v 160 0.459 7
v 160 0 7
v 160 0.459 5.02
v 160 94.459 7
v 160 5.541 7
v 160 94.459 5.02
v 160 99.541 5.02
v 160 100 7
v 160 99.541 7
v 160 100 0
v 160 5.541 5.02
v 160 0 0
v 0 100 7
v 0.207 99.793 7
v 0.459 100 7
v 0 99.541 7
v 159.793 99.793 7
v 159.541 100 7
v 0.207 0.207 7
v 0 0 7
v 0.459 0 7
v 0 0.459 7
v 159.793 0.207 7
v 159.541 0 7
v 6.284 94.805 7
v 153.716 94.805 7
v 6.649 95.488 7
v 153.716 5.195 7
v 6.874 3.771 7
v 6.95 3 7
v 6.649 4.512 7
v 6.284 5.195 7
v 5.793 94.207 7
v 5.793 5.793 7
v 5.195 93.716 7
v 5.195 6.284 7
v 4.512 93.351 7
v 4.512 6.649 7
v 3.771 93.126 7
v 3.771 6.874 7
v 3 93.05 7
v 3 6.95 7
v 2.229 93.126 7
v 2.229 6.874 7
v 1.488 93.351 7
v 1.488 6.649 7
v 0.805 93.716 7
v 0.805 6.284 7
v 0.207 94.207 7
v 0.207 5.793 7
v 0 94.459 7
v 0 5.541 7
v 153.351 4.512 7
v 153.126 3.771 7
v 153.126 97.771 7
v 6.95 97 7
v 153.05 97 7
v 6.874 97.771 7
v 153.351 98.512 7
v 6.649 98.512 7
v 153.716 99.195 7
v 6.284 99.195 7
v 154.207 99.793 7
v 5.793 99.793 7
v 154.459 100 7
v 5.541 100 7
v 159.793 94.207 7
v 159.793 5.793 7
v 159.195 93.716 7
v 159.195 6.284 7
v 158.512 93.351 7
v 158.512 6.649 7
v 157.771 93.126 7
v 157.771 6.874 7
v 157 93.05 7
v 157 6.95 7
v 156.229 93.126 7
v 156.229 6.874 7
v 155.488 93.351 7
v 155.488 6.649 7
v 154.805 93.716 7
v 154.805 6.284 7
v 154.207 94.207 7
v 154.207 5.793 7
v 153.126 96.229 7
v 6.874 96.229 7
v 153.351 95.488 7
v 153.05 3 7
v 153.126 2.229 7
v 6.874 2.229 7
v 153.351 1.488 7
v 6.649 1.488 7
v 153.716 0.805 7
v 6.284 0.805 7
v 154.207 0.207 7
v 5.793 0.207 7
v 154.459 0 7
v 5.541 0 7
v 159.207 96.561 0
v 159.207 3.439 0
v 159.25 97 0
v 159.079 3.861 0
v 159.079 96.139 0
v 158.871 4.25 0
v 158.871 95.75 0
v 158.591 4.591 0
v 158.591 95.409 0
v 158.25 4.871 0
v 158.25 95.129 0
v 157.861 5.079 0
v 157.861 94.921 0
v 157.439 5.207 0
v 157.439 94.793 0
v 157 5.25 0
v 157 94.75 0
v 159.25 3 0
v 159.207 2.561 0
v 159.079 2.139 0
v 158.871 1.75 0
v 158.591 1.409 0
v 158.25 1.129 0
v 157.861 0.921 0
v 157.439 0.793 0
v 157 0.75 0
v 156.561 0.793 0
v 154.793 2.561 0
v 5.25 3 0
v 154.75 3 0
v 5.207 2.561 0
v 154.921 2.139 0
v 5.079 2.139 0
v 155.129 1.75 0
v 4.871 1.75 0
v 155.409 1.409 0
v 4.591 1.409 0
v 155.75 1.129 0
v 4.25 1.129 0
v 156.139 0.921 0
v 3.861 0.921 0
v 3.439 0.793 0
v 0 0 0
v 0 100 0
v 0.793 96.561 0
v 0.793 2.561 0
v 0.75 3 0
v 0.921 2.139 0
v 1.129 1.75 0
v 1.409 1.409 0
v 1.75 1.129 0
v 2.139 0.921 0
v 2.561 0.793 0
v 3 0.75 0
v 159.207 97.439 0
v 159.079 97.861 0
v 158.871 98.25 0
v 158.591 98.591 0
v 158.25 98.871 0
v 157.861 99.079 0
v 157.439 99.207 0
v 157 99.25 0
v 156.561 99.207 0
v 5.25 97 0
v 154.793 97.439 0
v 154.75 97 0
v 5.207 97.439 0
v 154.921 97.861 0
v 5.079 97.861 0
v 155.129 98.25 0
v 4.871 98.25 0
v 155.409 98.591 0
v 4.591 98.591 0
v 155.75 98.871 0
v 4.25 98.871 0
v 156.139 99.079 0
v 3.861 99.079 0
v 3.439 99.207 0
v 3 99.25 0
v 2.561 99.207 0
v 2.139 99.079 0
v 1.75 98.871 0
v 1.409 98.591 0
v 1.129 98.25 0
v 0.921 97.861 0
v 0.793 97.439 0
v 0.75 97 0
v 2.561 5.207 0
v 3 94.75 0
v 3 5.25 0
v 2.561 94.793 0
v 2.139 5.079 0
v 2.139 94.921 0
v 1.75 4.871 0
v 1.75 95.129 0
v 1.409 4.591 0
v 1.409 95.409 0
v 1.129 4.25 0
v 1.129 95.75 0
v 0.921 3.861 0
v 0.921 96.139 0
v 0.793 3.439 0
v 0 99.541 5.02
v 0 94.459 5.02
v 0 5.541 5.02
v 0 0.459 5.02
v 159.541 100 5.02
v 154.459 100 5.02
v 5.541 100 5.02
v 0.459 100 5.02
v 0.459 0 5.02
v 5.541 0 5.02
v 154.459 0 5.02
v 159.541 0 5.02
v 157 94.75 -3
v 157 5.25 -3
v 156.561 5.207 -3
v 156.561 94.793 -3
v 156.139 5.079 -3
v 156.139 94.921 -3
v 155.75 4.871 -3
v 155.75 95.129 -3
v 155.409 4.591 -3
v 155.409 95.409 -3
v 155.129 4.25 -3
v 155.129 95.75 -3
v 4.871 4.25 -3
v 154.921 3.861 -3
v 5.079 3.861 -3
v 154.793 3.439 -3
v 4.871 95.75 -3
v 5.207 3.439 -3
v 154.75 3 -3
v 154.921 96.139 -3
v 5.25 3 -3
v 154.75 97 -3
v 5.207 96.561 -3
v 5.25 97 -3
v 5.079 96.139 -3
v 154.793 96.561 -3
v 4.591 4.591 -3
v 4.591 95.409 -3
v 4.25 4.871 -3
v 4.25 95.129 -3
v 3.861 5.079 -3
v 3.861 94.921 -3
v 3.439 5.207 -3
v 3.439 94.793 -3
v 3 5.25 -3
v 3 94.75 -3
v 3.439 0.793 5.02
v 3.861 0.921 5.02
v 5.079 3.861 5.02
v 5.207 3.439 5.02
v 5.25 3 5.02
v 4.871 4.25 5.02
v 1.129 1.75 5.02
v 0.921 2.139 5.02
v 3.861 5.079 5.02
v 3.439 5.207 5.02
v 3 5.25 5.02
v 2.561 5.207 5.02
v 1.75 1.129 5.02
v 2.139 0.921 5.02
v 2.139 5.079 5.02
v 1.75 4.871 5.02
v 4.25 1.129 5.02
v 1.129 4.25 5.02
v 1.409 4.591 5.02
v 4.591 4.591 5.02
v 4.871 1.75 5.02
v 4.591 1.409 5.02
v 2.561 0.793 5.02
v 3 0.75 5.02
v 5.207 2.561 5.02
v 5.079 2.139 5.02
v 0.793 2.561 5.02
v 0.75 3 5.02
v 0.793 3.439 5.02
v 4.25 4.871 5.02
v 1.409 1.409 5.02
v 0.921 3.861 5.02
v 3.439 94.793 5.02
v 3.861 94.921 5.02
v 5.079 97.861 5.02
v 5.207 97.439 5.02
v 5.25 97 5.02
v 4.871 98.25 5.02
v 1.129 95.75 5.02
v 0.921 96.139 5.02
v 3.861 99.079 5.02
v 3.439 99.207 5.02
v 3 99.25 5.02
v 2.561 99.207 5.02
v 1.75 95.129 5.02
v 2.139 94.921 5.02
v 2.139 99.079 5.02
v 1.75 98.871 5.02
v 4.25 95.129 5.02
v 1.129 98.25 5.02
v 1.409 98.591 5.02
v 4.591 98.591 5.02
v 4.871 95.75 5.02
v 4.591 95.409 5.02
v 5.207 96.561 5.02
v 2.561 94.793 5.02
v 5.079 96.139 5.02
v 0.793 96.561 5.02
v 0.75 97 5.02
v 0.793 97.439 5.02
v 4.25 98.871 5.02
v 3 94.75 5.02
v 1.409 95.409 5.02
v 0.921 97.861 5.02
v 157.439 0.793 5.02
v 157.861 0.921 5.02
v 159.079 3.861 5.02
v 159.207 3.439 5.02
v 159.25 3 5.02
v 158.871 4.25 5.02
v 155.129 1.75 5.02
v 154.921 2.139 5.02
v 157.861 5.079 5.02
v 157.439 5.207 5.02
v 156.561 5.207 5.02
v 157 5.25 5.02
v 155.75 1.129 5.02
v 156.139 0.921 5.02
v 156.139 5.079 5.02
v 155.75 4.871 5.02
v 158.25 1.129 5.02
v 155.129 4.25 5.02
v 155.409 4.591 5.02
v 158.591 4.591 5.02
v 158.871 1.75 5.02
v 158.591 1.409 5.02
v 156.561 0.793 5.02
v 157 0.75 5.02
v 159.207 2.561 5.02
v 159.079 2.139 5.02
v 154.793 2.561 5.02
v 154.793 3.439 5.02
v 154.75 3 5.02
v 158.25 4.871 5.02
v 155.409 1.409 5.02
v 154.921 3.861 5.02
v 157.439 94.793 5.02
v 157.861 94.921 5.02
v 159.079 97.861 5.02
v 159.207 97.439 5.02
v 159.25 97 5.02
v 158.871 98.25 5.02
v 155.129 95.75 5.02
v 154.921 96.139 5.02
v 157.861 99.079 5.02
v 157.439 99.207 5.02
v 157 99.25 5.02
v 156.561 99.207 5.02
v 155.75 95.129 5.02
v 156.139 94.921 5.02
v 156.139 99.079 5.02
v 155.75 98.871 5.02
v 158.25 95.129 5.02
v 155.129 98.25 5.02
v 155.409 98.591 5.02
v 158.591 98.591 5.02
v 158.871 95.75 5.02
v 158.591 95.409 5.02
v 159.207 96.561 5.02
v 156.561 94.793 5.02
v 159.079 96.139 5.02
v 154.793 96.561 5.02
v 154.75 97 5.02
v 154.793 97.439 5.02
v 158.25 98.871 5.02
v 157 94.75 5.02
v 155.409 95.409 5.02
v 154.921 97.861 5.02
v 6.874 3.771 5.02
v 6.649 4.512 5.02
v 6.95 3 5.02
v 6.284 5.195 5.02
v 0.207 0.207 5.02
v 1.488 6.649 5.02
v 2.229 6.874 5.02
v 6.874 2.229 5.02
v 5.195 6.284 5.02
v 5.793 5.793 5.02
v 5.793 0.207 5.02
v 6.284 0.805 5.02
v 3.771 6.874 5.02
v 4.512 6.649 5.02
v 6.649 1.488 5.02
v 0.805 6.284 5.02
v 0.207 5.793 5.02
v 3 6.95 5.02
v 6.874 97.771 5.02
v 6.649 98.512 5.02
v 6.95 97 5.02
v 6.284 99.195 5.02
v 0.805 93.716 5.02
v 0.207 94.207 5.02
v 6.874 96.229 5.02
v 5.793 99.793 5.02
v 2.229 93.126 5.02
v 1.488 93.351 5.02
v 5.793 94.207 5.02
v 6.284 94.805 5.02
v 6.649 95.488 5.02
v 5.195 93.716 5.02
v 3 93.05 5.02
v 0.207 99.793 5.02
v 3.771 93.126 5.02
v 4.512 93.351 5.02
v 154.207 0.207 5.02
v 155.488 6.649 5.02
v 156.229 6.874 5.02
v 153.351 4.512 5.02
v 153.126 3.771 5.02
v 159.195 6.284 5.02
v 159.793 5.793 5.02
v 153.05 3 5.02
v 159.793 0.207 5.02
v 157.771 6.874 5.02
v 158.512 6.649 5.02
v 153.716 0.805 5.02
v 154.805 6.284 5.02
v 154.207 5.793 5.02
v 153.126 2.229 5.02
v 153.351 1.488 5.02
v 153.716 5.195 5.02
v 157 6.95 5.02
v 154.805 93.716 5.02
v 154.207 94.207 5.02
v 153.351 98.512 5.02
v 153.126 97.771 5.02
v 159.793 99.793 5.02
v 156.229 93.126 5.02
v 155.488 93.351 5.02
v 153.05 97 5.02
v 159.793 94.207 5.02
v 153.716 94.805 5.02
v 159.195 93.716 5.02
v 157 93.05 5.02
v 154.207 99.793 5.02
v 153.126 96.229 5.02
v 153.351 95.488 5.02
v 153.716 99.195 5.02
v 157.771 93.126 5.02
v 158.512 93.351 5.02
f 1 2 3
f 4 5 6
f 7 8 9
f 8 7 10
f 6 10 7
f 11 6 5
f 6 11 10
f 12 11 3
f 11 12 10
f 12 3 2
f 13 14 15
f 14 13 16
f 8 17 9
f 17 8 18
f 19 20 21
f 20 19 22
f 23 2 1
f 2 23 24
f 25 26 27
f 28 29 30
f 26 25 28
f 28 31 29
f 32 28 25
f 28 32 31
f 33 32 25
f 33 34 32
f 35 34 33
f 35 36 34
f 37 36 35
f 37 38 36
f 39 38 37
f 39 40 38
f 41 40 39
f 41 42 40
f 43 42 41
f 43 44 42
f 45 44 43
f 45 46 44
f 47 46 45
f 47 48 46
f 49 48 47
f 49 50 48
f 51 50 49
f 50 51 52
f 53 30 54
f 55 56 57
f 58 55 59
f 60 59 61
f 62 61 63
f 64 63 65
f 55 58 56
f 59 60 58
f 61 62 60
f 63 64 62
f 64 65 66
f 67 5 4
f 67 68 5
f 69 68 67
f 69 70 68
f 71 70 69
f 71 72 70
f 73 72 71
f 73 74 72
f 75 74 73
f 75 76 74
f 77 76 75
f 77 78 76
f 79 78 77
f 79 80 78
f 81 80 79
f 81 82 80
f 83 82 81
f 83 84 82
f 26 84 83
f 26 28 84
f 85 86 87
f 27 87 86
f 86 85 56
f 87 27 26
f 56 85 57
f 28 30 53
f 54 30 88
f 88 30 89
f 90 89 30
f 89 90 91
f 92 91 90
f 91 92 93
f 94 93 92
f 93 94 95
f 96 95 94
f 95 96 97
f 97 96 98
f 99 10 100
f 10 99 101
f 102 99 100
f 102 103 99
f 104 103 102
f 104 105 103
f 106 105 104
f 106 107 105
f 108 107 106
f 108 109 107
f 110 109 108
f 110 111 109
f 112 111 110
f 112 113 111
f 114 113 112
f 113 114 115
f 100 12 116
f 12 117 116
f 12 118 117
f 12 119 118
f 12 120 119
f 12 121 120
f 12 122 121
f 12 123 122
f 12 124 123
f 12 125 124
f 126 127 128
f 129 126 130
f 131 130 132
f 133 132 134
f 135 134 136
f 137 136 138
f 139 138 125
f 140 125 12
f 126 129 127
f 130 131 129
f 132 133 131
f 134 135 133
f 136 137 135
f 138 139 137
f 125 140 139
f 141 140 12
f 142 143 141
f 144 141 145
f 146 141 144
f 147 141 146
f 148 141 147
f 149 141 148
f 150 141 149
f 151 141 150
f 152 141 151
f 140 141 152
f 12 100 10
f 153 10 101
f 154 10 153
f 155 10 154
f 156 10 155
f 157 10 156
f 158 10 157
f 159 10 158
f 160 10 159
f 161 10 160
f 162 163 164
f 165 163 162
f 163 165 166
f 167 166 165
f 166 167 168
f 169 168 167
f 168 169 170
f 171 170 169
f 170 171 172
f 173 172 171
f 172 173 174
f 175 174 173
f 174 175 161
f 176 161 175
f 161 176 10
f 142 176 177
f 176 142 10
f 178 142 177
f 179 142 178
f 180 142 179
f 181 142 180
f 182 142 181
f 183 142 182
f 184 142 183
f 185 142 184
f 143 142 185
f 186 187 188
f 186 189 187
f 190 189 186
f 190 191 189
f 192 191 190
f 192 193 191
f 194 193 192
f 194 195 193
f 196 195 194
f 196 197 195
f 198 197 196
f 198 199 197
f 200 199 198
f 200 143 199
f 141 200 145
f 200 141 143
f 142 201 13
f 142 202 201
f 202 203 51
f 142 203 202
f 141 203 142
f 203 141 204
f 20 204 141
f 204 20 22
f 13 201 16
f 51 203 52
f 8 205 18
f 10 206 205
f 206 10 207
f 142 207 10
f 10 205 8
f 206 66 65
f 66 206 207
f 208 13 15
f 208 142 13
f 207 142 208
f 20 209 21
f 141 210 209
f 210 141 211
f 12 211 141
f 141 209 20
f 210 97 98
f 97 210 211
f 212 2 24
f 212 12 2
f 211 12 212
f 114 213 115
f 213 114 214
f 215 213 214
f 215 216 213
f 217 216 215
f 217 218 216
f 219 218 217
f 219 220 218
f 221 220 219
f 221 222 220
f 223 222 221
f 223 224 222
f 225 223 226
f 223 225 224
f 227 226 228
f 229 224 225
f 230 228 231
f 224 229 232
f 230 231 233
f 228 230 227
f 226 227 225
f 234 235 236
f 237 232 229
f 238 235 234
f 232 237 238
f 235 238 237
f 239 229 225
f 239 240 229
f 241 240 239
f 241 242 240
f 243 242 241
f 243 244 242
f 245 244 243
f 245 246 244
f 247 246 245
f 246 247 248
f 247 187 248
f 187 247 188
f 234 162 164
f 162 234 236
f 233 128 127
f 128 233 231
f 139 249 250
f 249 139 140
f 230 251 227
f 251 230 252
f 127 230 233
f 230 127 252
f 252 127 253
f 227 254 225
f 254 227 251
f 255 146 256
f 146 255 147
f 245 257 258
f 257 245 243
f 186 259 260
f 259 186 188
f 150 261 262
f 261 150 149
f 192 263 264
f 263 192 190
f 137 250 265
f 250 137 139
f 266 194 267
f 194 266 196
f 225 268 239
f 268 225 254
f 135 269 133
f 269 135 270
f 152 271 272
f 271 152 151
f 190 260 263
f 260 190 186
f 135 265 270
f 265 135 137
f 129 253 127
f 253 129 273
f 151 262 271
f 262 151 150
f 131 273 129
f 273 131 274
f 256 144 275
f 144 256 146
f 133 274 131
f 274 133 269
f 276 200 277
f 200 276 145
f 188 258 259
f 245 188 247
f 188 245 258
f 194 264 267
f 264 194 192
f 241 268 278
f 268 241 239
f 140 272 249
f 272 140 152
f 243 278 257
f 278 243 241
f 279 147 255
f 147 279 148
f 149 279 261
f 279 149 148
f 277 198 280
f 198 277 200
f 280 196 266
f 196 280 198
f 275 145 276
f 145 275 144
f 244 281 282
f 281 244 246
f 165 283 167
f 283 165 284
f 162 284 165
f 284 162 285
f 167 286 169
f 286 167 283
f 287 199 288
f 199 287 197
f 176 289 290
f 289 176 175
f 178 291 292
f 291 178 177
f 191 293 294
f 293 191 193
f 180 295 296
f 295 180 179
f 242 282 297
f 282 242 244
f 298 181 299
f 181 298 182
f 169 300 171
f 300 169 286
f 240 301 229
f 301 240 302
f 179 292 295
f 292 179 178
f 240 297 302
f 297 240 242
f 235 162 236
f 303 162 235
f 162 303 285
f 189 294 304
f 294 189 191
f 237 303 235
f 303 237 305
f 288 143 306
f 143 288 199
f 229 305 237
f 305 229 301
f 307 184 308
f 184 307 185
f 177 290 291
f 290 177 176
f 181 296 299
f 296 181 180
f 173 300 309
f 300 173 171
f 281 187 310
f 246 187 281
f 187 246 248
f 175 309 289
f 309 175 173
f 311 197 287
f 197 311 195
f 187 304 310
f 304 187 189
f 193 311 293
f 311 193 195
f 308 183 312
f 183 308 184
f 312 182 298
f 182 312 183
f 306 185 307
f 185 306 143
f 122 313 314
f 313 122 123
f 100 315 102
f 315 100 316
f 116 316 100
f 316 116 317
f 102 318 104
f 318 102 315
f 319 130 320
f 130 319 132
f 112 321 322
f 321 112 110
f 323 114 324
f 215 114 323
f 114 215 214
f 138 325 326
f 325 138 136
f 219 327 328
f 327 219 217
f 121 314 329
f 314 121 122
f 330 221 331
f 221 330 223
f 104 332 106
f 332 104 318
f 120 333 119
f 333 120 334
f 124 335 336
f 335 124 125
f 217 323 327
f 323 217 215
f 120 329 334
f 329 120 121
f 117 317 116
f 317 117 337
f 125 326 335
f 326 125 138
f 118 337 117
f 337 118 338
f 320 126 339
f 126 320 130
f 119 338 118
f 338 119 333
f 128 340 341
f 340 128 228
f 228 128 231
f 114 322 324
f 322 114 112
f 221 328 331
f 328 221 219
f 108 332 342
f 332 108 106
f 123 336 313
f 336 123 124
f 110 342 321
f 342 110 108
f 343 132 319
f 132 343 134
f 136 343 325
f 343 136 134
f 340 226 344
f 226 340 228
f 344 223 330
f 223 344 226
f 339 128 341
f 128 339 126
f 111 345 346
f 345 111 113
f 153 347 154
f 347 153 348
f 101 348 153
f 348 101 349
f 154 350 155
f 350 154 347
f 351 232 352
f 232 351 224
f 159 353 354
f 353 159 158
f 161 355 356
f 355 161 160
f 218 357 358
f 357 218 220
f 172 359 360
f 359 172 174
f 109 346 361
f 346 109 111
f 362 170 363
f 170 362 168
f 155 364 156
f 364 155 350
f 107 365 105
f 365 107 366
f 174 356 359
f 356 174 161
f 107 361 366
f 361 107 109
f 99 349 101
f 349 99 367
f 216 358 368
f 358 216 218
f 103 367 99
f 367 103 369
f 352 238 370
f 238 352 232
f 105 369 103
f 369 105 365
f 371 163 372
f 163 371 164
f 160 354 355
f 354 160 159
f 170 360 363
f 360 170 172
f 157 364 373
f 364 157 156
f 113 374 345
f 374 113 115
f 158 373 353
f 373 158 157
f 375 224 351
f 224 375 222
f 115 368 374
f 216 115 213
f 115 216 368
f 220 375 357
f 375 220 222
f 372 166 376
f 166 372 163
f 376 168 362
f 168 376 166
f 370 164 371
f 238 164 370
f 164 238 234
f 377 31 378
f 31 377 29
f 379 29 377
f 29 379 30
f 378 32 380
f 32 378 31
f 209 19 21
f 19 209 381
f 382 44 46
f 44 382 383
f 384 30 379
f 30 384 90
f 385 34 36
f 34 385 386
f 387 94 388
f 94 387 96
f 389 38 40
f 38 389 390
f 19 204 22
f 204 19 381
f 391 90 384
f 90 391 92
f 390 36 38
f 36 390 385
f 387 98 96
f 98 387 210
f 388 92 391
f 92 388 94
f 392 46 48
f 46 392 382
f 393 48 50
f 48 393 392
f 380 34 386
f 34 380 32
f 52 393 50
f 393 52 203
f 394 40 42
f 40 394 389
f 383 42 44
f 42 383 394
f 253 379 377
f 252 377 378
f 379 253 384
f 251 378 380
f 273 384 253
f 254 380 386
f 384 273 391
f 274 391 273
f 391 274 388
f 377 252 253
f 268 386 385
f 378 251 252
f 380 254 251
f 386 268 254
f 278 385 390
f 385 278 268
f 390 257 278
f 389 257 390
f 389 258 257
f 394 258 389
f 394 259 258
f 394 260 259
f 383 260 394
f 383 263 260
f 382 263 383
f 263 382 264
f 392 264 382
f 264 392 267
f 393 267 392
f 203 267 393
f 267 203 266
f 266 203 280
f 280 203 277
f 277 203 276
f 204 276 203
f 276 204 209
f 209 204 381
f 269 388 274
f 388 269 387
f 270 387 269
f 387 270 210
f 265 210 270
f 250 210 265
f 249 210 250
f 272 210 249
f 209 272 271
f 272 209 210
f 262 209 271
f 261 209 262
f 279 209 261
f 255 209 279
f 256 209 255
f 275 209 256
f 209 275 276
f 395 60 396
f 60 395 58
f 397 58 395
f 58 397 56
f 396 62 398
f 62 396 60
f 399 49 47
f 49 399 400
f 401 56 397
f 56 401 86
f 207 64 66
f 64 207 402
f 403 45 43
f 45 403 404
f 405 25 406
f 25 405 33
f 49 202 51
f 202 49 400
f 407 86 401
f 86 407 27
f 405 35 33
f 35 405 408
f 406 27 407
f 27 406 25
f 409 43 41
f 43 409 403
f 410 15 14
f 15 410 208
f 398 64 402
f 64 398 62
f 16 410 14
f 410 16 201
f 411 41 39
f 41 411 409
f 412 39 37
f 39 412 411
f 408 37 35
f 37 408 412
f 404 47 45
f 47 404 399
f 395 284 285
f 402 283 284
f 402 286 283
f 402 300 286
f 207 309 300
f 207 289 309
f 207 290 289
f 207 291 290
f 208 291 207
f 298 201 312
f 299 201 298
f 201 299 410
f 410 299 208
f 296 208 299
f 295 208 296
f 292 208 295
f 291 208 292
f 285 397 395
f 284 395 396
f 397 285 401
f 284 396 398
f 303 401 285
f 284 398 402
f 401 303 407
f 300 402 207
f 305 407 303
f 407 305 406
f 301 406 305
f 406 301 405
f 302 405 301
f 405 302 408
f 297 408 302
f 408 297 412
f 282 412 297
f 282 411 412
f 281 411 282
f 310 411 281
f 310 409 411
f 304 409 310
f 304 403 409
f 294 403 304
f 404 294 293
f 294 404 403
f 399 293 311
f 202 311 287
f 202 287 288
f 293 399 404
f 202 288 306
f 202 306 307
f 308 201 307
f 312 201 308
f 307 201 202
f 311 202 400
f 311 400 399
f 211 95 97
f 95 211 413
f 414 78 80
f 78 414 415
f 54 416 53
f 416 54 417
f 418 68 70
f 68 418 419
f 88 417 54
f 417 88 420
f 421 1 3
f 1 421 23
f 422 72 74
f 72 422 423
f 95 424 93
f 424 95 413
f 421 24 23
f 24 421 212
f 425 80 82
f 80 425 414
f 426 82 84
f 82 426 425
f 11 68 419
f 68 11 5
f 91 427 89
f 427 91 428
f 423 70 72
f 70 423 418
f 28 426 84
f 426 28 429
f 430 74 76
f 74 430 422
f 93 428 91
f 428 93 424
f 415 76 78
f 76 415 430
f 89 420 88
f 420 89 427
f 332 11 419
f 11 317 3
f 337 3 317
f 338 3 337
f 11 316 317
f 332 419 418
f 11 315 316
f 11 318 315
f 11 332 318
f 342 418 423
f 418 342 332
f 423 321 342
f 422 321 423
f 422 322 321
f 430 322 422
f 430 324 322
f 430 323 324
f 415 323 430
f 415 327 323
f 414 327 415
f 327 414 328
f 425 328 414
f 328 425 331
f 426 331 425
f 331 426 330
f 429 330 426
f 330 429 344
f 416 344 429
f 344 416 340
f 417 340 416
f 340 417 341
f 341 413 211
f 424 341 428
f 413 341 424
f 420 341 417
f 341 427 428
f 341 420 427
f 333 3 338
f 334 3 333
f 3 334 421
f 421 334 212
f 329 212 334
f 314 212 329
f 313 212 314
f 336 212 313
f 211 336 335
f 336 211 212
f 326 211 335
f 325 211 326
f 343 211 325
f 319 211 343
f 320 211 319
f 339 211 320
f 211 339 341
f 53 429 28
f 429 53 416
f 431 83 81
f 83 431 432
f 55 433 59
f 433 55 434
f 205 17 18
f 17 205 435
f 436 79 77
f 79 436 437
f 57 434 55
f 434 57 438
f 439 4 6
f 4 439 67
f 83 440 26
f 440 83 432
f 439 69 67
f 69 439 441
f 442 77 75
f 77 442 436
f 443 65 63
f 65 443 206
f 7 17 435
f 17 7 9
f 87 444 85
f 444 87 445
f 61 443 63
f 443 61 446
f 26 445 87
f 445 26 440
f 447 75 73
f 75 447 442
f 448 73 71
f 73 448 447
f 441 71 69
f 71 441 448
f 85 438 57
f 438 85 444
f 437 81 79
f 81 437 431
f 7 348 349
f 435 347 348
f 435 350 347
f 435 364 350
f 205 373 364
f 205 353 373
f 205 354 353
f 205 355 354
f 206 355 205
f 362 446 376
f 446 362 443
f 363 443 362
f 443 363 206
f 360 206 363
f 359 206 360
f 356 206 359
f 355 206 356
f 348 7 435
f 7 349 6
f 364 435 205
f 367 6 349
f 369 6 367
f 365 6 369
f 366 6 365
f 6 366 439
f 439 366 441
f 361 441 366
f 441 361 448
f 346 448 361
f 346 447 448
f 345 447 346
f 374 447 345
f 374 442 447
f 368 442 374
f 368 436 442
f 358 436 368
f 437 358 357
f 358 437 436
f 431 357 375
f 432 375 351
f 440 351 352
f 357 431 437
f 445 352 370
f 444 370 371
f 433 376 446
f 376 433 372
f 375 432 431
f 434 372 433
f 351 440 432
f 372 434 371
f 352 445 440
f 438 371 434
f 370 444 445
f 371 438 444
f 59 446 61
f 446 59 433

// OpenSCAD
$fn = 32;

// ----------------------------------------------------------------------
// Enclosure lid: 160 x 100 x 7 mm, 4 bolt holes
// ----------------------------------------------------------------------

// --- parameters (mm) ---
length = 160;             // lid length, X
width = 100;              // lid width, Y
plate_t = 7;              // lid plate thickness
bolt_d = 4.5;             // bolt clearance
boss_lip = 3;             // bolt hole inset from the corner
sink = 1;                 // overlap of the lip and ribs into the plate
lip_h = 4;                // lip height below the plate
lip_wall = 3;             // lip wall thickness
cs_d = 7.9;               // countersink diameter
cs_h = 1.98;              // countersink depth

module plate() {
  cube([length, width, plate_t]);
  /* lip that drops into the housing opening, sunk into the plate */
  translate([lip_wall, lip_wall, -lip_h + sink]) cube([length - 2 * lip_wall, width - 2 * lip_wall, lip_h]);
}

difference() {
  plate();
  /* bolt pattern matching the corner bosses */
  for (sx = [0, 1]) for (sy = [0, 1])
    translate([sx * (length - 2 * boss_lip) + boss_lip, sy * (width - 2 * boss_lip) + boss_lip, -lip_h - 1])
      cylinder(h = plate_t + lip_h + 2, d = bolt_d);
  /* countersinks so the heads sit flush */
  for (sx = [0, 1]) for (sy = [0, 1])
    translate([sx * (length - 2 * boss_lip) + boss_lip, sy * (width - 2 * boss_lip) + boss_lip, plate_t - cs_h])
      cylinder(h = cs_h + 0.5, d = cs_d);
}
